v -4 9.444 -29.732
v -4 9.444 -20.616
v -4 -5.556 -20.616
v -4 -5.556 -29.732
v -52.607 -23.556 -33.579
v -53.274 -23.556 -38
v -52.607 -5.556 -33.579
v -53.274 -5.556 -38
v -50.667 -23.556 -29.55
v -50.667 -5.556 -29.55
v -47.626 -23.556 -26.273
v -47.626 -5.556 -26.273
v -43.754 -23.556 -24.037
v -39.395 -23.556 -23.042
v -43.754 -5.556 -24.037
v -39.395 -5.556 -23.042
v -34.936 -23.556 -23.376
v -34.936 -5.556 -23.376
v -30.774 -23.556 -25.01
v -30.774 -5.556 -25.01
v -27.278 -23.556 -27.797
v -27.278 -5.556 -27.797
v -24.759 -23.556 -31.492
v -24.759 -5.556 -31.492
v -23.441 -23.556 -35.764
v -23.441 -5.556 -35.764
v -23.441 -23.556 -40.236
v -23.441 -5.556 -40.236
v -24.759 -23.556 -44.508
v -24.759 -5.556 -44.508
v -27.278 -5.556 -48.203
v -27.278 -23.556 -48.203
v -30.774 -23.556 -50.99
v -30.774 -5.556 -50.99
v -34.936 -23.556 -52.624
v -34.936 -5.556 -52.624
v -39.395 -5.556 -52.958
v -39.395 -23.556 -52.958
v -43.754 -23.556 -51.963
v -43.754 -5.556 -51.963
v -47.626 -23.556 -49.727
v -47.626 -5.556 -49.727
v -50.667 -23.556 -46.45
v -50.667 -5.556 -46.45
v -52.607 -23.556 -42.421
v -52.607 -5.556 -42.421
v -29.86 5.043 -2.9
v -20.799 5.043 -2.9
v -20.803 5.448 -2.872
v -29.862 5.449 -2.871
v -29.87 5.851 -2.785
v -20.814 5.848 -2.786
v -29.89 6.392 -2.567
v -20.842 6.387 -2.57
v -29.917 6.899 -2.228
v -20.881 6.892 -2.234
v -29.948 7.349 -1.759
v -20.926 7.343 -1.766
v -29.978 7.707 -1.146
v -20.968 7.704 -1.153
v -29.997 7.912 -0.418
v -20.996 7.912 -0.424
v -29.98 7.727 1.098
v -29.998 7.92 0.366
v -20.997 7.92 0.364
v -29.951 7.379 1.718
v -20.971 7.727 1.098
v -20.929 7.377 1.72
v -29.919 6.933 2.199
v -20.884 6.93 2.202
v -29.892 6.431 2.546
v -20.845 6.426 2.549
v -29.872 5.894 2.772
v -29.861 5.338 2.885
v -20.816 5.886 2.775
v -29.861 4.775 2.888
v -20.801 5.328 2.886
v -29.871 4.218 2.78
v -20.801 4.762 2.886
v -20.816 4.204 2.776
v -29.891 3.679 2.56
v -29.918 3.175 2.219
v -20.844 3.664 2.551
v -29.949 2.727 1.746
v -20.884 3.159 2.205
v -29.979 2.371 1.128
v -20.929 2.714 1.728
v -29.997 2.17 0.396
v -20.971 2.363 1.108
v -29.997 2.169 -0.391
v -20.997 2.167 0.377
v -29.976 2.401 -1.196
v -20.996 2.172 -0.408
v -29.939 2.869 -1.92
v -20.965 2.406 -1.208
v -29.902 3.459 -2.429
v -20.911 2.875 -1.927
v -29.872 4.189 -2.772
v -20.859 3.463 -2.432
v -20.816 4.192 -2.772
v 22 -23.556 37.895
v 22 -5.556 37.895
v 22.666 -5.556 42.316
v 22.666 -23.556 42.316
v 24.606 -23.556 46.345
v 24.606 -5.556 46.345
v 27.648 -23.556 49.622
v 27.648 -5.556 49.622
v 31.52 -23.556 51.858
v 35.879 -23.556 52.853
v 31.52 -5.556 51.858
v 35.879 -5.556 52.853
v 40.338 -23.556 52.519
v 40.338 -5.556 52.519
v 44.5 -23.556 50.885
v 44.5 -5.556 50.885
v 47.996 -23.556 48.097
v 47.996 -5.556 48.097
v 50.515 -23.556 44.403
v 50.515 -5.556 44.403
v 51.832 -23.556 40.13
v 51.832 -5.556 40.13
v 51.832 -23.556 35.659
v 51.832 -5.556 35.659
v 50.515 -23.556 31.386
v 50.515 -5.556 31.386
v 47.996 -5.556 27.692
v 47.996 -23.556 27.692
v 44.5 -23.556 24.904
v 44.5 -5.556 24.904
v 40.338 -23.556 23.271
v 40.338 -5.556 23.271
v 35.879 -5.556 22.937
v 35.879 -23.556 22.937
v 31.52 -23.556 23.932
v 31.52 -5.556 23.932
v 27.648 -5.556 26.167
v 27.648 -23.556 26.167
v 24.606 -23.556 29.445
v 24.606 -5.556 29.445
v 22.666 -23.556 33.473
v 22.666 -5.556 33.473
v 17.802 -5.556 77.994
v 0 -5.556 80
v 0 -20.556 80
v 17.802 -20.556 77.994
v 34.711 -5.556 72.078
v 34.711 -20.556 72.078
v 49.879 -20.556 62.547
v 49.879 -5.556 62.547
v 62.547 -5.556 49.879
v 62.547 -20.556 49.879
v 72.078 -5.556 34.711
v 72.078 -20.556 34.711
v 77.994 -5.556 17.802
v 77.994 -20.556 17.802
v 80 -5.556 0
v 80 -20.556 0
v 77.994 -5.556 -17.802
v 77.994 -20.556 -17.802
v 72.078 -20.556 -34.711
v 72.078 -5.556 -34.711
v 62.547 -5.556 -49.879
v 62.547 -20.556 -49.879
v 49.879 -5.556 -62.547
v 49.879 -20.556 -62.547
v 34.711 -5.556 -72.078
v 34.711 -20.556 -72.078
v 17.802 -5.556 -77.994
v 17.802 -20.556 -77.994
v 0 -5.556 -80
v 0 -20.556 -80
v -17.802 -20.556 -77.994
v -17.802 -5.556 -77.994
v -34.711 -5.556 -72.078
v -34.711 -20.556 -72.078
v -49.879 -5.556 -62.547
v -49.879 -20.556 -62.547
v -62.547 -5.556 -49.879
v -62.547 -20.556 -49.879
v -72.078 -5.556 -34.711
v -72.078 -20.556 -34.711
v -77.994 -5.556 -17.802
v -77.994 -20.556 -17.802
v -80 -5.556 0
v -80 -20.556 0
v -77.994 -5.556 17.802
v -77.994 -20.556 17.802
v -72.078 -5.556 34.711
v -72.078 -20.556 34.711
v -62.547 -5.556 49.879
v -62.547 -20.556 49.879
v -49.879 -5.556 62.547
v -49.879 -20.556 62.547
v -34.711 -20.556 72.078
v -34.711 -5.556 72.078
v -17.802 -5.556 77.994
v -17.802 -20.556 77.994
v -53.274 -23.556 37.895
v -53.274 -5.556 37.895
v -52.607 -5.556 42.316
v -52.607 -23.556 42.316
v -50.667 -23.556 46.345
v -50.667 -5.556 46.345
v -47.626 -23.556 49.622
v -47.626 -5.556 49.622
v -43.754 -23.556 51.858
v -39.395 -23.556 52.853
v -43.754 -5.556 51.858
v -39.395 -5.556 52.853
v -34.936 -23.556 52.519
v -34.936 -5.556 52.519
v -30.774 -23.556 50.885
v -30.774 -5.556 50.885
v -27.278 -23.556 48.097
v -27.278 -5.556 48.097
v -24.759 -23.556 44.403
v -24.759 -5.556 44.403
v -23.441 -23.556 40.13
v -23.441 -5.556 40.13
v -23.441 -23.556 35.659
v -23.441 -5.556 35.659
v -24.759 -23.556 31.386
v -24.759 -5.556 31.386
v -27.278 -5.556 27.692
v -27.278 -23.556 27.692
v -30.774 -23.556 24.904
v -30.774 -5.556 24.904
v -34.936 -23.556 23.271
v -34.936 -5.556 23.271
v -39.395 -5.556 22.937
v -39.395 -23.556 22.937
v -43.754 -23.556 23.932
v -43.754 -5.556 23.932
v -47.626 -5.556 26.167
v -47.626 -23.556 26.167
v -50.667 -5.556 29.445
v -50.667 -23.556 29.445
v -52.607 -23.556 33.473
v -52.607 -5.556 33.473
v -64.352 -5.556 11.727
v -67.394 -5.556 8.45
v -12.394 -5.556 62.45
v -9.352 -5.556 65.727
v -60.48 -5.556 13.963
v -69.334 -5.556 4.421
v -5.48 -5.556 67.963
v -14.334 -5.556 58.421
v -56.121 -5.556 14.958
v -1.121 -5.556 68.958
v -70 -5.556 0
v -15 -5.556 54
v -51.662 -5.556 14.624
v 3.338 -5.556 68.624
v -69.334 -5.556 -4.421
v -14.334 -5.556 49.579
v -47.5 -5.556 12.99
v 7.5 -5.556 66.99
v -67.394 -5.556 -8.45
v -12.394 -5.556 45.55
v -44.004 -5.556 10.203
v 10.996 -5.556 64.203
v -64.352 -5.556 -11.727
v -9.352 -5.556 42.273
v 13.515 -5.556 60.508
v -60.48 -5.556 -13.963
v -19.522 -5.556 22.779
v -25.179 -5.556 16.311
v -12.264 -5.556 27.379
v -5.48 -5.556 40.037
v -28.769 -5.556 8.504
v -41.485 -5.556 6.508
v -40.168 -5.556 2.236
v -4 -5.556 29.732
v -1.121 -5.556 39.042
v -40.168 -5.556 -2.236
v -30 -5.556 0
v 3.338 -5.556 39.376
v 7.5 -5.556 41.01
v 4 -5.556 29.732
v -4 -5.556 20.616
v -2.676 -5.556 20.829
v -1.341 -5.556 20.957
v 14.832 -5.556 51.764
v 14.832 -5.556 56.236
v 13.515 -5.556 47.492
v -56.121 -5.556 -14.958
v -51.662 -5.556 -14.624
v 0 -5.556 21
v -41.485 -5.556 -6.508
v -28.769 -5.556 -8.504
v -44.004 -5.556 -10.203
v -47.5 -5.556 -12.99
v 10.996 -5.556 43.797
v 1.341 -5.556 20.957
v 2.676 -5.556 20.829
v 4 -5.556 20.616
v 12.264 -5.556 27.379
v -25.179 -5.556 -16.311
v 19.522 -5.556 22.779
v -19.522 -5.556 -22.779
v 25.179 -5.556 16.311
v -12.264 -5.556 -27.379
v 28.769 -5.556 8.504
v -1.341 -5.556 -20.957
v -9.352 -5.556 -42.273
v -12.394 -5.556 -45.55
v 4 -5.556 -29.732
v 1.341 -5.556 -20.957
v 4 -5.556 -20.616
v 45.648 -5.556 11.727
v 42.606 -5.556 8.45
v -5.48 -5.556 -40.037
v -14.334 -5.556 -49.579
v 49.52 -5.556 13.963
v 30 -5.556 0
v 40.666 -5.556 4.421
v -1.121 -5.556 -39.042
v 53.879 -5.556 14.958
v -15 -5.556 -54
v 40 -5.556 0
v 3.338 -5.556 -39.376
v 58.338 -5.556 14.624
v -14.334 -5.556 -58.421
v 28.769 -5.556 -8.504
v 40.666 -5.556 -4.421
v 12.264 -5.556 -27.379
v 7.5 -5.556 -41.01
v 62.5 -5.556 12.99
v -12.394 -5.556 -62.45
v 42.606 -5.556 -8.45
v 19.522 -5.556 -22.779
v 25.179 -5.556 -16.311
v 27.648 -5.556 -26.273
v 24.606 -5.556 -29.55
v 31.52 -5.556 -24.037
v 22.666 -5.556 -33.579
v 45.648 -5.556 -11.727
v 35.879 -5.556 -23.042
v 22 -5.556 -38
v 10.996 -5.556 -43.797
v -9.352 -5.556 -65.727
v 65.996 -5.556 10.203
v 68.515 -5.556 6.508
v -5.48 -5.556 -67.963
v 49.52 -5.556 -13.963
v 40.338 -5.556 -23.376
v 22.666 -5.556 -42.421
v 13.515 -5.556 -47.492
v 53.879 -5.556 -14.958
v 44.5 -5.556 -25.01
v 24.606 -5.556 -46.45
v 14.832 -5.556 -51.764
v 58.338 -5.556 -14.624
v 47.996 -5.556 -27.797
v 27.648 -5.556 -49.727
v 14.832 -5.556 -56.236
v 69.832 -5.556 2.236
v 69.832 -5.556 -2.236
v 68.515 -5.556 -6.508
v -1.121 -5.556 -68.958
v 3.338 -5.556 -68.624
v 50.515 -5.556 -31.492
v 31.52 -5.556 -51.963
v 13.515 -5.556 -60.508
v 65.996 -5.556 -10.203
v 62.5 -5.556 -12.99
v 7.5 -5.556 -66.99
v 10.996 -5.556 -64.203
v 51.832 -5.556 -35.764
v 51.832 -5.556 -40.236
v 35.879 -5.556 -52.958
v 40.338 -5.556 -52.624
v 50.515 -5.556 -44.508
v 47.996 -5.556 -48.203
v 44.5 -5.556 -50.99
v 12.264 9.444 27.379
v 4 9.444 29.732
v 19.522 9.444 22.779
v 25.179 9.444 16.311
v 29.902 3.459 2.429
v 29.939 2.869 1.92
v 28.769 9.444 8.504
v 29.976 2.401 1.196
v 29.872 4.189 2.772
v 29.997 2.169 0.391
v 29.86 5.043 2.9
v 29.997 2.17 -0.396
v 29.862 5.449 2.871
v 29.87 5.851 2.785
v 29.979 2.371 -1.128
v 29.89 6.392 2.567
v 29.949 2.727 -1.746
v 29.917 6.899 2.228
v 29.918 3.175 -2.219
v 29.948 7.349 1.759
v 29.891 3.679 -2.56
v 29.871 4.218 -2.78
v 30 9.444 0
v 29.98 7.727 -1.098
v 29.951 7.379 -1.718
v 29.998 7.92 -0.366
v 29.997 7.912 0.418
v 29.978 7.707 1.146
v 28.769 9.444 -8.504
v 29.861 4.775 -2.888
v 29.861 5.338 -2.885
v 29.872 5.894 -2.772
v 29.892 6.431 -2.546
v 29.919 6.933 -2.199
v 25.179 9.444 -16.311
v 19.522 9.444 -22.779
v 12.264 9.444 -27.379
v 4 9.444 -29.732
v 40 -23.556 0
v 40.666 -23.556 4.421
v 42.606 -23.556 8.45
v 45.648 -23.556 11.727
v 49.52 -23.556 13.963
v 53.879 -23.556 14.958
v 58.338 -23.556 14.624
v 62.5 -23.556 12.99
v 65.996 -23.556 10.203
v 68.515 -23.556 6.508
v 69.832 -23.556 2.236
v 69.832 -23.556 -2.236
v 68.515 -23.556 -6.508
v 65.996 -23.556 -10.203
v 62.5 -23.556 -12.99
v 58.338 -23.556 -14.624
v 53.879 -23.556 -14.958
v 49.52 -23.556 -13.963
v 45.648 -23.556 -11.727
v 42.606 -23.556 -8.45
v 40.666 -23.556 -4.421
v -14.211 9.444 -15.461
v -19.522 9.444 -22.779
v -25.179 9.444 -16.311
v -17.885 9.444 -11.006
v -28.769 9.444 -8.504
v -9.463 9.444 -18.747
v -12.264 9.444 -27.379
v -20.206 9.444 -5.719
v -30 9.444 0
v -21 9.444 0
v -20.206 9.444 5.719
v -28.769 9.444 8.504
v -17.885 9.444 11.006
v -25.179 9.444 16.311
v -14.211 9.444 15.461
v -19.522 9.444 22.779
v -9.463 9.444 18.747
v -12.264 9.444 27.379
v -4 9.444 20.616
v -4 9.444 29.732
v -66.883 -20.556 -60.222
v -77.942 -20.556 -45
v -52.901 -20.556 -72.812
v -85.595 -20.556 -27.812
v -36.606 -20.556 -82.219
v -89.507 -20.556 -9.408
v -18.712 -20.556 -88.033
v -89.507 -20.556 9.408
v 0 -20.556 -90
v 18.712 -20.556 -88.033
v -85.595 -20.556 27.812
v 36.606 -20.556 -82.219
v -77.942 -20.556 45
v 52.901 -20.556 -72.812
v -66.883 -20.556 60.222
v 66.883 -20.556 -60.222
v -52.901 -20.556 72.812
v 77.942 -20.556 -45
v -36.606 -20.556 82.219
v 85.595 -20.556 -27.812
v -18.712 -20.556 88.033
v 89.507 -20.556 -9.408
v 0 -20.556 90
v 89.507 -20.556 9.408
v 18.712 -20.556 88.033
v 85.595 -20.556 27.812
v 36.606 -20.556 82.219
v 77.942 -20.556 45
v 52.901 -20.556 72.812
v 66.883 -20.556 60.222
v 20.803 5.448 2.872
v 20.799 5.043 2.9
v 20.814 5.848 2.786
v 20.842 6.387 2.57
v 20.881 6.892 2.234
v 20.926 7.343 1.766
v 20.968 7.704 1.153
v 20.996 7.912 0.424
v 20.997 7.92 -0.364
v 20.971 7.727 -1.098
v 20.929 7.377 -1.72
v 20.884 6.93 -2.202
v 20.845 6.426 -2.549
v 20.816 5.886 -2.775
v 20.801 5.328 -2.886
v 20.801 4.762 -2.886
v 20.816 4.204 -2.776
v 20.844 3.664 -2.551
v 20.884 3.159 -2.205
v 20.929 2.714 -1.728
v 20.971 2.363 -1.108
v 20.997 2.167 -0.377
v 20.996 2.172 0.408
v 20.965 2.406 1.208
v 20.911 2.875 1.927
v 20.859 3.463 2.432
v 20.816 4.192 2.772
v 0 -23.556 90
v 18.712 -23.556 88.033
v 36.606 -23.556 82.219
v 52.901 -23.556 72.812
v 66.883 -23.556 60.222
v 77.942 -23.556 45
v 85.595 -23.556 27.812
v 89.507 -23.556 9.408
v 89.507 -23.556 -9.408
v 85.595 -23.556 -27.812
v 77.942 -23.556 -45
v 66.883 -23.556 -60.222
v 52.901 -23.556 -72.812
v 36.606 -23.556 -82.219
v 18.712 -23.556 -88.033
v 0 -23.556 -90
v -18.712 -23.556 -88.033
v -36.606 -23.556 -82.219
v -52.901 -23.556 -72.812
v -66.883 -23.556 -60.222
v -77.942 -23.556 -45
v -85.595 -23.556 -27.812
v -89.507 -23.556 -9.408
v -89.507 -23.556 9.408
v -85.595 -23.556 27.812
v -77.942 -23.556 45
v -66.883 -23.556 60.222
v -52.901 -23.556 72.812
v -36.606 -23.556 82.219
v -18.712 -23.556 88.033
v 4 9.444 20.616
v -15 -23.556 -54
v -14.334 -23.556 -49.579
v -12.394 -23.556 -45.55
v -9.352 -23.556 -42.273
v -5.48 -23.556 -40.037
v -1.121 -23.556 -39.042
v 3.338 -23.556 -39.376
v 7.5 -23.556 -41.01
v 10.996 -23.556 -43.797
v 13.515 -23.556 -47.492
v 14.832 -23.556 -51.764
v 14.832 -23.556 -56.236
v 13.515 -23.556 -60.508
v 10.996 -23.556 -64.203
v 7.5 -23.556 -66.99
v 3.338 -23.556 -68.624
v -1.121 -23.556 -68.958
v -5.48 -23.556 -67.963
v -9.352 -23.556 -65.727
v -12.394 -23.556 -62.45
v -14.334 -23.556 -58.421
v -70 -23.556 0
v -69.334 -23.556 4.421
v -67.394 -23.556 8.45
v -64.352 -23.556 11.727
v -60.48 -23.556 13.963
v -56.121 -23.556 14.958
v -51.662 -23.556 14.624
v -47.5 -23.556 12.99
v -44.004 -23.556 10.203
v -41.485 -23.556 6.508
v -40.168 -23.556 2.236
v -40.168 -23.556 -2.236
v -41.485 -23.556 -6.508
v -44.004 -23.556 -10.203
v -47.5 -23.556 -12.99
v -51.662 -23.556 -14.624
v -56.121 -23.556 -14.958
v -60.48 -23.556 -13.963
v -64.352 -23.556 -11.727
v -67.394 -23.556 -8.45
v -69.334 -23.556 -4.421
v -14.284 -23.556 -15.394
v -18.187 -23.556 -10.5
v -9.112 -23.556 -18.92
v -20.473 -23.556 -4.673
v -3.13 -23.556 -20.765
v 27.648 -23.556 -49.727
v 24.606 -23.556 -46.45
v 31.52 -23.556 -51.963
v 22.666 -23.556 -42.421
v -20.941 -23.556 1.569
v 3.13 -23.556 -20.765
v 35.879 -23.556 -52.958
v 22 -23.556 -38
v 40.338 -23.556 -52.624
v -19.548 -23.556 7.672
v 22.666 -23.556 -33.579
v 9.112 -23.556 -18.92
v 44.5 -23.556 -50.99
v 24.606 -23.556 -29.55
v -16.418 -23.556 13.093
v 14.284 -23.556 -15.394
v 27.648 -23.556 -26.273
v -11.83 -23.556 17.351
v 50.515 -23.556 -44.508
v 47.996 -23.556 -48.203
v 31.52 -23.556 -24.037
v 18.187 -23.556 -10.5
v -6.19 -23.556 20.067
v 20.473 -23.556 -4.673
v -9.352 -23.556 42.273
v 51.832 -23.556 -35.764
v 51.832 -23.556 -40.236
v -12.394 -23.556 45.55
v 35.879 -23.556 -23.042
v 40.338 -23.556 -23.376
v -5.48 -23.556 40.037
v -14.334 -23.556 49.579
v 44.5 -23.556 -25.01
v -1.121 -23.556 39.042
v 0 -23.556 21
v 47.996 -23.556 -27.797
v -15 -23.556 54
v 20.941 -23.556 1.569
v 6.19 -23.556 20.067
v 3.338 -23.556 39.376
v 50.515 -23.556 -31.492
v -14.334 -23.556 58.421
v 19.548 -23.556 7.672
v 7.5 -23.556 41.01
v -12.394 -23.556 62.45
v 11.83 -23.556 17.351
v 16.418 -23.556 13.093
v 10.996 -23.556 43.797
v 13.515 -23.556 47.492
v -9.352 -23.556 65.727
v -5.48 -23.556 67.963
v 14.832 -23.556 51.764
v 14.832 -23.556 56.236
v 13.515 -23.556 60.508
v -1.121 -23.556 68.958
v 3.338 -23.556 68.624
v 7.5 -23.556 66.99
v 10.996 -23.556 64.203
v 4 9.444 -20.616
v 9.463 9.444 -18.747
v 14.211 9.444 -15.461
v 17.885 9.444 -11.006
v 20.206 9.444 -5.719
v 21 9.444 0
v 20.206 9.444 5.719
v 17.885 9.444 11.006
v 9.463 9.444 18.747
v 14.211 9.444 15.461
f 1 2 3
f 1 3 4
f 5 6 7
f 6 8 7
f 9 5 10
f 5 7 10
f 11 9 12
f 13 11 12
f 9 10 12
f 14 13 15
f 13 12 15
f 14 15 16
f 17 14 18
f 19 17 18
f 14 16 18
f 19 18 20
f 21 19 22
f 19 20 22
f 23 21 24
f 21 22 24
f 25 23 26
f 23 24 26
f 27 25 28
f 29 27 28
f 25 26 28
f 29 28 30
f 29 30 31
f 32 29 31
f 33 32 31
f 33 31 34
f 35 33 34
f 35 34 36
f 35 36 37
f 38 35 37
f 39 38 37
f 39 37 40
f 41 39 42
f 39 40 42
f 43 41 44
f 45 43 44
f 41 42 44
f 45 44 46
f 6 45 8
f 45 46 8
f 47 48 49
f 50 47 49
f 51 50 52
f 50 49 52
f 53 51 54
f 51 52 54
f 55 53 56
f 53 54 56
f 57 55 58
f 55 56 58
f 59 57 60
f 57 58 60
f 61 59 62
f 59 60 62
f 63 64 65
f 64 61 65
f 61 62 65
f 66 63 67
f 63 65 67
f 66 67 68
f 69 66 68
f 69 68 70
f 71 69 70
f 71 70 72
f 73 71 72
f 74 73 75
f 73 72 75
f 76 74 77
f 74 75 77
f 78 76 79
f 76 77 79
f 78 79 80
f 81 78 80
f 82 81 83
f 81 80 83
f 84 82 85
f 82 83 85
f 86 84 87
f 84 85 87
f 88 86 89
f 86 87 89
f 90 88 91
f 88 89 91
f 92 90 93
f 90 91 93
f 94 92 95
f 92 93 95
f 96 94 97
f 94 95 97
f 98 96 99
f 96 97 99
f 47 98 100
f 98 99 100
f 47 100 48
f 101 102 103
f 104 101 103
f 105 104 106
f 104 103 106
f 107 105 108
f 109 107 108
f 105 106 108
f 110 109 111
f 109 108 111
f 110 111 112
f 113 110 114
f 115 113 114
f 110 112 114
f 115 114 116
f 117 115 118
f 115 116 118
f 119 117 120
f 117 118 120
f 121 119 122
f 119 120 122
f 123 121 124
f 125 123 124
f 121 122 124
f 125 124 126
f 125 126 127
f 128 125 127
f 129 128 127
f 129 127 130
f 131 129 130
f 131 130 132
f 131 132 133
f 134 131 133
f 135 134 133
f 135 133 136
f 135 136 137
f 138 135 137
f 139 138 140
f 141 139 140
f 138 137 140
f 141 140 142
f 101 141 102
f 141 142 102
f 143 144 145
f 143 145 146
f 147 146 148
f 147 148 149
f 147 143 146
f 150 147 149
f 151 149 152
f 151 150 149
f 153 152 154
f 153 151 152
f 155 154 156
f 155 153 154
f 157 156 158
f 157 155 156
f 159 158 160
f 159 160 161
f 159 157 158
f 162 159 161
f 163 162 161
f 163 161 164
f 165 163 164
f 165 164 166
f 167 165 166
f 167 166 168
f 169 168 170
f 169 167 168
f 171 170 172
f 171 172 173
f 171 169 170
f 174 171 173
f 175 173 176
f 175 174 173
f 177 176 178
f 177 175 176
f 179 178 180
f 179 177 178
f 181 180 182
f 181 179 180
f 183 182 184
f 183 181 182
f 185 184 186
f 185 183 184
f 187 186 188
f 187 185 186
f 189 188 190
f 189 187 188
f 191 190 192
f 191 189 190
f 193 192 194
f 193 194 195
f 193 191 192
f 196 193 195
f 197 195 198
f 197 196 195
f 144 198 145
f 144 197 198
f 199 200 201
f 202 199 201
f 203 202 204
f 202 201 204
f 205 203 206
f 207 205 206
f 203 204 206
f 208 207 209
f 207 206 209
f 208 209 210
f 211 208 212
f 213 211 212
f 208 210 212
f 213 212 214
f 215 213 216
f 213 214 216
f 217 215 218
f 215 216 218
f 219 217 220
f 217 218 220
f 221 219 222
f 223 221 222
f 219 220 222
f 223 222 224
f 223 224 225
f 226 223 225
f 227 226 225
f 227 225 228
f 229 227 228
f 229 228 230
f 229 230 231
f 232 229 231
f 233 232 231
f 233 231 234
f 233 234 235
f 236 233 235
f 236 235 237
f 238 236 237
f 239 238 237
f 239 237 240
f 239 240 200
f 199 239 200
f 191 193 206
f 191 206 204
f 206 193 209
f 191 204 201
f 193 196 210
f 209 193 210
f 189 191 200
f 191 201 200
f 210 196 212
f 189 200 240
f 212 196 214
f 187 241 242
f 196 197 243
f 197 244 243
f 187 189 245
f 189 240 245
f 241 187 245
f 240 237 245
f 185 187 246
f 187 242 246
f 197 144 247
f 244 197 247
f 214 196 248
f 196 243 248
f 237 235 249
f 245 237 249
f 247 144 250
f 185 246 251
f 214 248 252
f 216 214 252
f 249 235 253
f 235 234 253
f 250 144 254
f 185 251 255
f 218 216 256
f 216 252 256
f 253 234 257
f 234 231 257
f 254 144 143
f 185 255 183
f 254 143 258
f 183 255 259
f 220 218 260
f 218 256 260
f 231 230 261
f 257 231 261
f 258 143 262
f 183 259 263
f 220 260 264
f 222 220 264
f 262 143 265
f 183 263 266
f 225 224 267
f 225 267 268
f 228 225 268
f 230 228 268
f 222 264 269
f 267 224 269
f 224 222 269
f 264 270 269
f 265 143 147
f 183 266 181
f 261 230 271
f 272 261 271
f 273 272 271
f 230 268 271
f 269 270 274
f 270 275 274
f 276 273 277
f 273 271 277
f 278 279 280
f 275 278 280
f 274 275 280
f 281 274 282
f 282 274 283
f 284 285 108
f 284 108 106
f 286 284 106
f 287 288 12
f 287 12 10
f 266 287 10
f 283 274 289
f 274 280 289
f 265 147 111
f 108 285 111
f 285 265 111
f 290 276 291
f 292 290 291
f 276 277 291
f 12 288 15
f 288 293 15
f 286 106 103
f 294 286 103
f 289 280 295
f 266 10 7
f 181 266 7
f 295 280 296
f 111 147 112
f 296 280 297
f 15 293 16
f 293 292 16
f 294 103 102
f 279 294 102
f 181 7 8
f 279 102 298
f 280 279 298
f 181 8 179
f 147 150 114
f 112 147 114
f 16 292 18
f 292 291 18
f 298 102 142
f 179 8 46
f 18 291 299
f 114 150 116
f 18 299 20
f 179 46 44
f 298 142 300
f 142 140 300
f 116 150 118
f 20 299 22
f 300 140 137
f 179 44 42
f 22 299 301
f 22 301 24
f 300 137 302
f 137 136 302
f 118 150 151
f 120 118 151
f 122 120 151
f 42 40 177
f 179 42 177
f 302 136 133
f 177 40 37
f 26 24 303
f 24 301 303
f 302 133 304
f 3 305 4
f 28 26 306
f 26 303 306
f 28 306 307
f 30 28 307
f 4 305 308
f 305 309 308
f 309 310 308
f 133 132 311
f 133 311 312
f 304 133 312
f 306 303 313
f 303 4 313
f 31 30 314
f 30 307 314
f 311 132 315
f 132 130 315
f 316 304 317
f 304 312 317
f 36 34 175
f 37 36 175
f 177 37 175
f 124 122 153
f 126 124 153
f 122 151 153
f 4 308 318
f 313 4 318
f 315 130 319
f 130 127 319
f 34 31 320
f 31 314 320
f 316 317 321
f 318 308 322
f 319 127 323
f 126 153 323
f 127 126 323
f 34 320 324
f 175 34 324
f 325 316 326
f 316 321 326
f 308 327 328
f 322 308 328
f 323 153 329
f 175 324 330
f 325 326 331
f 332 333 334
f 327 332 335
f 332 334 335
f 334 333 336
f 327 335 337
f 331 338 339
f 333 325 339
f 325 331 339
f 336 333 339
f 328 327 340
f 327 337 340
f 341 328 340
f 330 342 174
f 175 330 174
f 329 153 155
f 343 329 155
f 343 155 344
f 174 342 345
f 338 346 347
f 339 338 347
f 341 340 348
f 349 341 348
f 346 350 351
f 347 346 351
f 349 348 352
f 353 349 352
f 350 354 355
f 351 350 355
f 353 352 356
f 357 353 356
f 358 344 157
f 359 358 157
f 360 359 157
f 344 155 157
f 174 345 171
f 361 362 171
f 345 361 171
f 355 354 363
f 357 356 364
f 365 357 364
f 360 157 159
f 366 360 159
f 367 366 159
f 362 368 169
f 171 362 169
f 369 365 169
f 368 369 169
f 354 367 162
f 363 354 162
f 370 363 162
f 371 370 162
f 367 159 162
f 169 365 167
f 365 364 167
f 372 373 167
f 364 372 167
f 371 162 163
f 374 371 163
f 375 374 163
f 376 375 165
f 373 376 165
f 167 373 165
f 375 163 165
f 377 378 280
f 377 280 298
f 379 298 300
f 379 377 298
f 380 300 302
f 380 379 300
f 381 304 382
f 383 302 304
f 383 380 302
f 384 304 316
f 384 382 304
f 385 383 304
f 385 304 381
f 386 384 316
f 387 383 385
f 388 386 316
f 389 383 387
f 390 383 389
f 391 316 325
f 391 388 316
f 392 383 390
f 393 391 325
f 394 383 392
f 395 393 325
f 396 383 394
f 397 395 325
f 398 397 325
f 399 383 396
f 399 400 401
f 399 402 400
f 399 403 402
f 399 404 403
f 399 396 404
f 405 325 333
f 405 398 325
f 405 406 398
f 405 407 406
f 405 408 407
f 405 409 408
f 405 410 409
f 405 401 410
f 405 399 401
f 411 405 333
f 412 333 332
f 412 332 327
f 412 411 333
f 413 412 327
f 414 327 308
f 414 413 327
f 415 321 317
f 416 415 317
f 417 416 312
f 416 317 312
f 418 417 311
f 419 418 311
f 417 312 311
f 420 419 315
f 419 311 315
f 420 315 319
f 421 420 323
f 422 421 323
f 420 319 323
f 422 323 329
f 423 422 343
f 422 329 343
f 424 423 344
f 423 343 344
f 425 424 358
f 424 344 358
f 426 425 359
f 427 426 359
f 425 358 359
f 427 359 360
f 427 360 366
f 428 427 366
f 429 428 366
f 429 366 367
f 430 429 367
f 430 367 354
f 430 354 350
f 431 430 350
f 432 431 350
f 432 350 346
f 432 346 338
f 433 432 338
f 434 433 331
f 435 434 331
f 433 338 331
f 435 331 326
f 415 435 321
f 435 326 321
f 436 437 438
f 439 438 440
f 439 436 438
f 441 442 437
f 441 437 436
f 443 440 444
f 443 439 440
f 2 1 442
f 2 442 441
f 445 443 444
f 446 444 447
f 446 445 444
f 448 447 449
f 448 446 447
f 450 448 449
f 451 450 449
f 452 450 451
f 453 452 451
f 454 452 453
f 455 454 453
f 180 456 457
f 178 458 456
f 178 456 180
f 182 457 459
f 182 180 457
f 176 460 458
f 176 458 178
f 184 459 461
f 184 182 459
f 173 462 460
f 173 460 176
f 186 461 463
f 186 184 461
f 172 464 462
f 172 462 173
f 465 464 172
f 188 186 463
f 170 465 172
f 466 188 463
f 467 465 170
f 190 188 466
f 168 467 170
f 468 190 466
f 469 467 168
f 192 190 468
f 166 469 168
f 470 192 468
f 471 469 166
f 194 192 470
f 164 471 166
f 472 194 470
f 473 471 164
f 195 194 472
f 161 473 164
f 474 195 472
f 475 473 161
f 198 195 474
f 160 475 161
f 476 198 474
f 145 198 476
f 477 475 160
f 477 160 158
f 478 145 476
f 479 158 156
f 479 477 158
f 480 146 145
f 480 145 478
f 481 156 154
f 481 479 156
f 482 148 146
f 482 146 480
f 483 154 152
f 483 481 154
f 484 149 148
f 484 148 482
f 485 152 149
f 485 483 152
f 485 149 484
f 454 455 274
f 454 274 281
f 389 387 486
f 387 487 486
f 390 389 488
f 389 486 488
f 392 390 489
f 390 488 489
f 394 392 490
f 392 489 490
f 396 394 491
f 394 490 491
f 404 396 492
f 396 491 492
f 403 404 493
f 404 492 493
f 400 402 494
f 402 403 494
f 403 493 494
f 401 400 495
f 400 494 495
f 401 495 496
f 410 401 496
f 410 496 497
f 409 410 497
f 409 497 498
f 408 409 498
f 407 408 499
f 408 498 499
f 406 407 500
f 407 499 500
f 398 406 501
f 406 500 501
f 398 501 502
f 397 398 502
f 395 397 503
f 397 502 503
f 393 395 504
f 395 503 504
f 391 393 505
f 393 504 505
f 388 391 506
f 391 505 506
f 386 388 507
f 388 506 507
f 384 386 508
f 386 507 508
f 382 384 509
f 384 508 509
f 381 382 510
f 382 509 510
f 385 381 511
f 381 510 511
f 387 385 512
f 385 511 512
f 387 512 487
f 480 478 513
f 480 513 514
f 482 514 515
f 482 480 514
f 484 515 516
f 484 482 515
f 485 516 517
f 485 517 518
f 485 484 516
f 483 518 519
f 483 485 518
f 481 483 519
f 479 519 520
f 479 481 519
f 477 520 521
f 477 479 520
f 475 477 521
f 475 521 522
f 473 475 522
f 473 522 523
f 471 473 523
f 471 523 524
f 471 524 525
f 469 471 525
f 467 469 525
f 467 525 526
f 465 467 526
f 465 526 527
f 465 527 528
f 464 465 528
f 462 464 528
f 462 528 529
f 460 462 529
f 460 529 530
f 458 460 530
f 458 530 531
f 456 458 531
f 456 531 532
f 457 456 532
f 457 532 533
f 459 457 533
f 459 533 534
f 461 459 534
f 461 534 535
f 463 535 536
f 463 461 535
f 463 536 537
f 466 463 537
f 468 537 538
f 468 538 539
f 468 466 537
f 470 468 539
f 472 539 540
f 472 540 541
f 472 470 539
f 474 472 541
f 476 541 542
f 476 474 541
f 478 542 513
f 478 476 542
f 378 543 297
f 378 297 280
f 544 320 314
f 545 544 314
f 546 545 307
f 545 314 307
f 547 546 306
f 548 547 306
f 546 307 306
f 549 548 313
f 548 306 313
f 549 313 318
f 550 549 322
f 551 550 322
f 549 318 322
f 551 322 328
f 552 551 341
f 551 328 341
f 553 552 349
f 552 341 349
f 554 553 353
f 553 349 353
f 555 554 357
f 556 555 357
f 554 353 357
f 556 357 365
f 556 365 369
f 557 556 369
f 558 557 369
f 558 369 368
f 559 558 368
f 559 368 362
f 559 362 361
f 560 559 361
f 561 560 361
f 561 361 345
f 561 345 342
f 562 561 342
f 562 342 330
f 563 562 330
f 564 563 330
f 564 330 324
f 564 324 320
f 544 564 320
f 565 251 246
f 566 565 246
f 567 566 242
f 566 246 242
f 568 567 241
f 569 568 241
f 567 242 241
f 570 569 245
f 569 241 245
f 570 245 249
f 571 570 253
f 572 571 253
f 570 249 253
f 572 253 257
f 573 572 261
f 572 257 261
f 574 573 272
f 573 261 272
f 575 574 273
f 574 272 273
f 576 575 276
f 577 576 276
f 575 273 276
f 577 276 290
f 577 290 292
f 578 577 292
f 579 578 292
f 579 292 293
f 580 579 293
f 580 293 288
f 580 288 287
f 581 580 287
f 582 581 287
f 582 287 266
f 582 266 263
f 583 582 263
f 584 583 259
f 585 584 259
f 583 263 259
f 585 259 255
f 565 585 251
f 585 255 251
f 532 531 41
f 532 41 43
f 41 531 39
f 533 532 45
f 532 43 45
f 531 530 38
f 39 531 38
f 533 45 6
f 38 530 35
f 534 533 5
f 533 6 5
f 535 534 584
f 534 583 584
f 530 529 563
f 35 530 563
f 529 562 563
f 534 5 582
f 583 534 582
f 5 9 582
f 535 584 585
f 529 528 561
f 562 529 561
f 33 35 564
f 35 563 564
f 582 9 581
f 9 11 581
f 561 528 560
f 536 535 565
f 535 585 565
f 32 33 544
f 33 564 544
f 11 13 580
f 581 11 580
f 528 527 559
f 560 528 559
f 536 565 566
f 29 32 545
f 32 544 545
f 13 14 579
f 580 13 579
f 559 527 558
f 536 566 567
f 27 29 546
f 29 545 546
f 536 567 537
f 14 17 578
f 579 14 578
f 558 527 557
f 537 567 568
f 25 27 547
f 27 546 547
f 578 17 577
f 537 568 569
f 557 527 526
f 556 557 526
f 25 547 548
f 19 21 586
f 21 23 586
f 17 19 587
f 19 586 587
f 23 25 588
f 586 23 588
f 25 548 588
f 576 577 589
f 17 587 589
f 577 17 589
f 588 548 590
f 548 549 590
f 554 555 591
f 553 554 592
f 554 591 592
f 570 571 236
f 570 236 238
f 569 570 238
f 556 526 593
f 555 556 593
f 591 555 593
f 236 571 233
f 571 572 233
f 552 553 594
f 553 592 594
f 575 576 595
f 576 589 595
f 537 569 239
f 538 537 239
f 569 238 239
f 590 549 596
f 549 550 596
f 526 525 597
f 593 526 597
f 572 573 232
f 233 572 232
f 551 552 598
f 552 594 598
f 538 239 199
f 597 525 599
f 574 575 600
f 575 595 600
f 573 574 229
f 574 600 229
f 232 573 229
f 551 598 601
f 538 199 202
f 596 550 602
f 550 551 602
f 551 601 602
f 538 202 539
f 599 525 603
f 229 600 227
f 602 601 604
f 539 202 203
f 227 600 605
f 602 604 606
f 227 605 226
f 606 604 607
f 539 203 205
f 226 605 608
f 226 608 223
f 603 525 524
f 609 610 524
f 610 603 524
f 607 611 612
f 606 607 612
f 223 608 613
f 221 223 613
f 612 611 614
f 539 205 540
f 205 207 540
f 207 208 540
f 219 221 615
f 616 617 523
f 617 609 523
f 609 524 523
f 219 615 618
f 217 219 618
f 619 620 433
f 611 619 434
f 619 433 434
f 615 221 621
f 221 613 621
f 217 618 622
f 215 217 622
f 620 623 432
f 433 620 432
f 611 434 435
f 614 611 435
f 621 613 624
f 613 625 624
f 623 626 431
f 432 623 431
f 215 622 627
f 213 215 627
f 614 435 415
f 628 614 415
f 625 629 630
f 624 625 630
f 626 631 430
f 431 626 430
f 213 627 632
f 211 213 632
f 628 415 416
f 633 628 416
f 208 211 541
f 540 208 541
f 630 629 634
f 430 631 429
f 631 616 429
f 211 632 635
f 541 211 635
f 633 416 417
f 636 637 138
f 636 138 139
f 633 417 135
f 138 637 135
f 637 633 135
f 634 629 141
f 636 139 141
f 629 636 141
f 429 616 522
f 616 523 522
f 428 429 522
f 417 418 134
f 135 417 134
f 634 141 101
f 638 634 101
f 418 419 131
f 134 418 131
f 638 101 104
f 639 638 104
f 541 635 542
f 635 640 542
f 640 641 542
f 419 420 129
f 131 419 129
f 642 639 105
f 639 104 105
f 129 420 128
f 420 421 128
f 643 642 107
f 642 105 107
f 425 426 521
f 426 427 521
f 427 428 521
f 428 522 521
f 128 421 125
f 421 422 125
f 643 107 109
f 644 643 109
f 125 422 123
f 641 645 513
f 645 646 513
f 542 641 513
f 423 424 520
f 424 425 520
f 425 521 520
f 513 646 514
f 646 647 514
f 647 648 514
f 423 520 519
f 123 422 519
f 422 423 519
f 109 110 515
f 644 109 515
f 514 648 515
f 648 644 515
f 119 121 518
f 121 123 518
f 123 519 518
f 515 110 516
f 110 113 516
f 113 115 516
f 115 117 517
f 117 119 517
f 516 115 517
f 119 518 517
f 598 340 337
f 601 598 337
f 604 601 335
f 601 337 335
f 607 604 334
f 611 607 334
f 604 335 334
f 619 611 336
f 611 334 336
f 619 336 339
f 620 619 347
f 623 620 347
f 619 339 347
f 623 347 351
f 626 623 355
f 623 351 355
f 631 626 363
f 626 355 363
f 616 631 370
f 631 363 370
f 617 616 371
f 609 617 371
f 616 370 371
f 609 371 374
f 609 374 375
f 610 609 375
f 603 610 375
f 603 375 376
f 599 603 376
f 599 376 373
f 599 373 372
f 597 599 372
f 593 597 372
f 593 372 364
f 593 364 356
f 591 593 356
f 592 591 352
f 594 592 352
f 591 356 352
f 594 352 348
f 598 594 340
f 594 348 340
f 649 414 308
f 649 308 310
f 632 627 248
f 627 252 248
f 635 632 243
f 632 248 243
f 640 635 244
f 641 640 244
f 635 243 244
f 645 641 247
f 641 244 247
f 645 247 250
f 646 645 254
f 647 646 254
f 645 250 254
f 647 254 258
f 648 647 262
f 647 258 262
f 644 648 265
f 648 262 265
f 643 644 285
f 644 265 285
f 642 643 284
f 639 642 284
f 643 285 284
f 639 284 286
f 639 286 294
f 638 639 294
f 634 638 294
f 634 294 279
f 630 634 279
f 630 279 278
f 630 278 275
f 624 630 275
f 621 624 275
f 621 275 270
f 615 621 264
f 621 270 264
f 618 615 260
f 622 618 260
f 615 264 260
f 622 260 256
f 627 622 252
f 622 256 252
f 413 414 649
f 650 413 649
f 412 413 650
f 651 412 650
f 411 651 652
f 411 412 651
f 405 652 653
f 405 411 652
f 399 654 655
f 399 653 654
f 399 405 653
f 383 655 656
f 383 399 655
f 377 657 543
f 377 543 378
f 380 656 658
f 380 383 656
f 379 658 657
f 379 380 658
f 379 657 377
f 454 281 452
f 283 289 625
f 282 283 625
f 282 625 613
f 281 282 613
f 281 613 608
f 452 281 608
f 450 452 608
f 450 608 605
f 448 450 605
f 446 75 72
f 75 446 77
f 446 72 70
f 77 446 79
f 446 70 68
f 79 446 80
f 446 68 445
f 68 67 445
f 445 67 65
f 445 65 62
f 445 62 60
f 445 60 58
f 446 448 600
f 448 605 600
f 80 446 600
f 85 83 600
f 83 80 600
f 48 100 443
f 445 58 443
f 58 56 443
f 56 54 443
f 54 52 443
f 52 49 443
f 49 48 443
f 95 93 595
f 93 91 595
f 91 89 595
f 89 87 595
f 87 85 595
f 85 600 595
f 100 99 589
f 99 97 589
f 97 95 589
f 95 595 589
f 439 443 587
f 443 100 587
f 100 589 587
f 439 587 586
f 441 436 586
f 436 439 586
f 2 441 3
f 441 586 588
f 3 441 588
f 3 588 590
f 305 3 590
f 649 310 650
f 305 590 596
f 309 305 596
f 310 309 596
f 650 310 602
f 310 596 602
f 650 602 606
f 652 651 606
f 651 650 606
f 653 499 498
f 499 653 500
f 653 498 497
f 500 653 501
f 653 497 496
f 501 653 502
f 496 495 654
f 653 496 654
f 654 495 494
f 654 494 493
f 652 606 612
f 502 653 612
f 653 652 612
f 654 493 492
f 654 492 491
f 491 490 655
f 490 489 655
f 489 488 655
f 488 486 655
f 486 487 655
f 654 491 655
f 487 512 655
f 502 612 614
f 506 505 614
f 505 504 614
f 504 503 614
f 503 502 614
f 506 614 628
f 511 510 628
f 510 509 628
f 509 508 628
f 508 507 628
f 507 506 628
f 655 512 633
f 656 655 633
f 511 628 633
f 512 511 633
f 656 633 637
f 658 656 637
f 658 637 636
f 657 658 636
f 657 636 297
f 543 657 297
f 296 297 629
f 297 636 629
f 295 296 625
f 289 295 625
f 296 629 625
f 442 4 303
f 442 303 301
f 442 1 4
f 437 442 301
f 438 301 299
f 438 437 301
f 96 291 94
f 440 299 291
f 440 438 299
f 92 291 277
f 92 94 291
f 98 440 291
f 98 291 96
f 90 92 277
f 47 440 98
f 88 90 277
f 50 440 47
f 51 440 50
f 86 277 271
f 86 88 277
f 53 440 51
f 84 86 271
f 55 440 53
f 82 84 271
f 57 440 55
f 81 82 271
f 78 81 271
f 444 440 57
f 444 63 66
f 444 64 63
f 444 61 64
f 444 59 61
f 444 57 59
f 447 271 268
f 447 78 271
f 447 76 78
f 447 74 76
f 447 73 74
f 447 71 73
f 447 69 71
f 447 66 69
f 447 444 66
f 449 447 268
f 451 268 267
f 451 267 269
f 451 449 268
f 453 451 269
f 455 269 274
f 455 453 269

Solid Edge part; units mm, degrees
sketch "Sketch1" plane through (0, 0, 0) normal (1, 0, 0) x (0, 1, 0)
  line L0 (-23.5556, 21) -> (-23.5556, 90)
  line L1 (-23.5556, 90) -> (-20.5556, 90)
  line L2 (-20.5556, 90) -> (-20.5556, 80)
  line L3 (-20.5556, 80) -> (-5.5556, 80)
  line L4 (-5.5556, 80) -> (-5.5556, 30)
  line L5 (-5.5556, 30) -> (9.4444, 30)
  line L6 (9.4444, 30) -> (9.4444, 21)
  line L7 (9.4444, 21) -> (-23.5556, 21)
  dimension "D1" = 3
  dimension "D2" = 15
  dimension "D3" = 15
  dimension "D4" = 21
  dimension "D5" = 10
  dimension "D6" = 50
  dimension "D7" = 80
revolve "RevolvedProtrusion1" add sketch "Sketch1" angle 360 about axis through (0, -60, 0) along (0, 1, 0)
sketch "Sketch2" plane through (0, -5.5556, 0) normal (0, 1, 0) x (-1, 0, 0)
  line L0 (-4, 40.4732) -> (4, 40.4732)
  line L1 (4, 40.4732) -> (4, -40.4732)
  line L2 (4, -40.4732) -> (-4, -40.4732)
  line L3 (-4, -40.4732) -> (-4, 40.4732)
  dimension "D1" = 8
  dimension "D2" = 80.9463
  dimension "D3" = 4
extrude "Cutout1" cut sketch "Sketch2" along normal blind 383.6956
hole "Hole_2" at (0, 5.0428, 0) direction (1, 0, 0) diameter 5.8 end up to next
hole "Hole_3" at (0, 5.0428, 0) direction (-1, 0, 0) diameter 5.8 end up to next
sketch "Sketch3" plane through (0, -5.5556, 0) normal (0, 1, 0) x (-1, 0, 0)
  circle A0 centre (0, -54) radius 15
  circle A1 centre (0, 54) radius 15
  circle A2 centre (38.2737, -38) radius 15
  circle A3 centre (38.2737, 37.8947) radius 15
  circle A4 centre (-37, 37.8947) radius 15
  circle A5 centre (-37, -38) radius 15
  circle A6 centre (-55, 0) radius 15
  circle A7 centre (55, 0) radius 15
  dimension "D1" = 55
  dimension "D2" = 55
  dimension "D3" = 37
  dimension "D4" = 38
extrude "ExtrudedCutout_6" cut sketch "Sketch3" against normal blind 135.9253
